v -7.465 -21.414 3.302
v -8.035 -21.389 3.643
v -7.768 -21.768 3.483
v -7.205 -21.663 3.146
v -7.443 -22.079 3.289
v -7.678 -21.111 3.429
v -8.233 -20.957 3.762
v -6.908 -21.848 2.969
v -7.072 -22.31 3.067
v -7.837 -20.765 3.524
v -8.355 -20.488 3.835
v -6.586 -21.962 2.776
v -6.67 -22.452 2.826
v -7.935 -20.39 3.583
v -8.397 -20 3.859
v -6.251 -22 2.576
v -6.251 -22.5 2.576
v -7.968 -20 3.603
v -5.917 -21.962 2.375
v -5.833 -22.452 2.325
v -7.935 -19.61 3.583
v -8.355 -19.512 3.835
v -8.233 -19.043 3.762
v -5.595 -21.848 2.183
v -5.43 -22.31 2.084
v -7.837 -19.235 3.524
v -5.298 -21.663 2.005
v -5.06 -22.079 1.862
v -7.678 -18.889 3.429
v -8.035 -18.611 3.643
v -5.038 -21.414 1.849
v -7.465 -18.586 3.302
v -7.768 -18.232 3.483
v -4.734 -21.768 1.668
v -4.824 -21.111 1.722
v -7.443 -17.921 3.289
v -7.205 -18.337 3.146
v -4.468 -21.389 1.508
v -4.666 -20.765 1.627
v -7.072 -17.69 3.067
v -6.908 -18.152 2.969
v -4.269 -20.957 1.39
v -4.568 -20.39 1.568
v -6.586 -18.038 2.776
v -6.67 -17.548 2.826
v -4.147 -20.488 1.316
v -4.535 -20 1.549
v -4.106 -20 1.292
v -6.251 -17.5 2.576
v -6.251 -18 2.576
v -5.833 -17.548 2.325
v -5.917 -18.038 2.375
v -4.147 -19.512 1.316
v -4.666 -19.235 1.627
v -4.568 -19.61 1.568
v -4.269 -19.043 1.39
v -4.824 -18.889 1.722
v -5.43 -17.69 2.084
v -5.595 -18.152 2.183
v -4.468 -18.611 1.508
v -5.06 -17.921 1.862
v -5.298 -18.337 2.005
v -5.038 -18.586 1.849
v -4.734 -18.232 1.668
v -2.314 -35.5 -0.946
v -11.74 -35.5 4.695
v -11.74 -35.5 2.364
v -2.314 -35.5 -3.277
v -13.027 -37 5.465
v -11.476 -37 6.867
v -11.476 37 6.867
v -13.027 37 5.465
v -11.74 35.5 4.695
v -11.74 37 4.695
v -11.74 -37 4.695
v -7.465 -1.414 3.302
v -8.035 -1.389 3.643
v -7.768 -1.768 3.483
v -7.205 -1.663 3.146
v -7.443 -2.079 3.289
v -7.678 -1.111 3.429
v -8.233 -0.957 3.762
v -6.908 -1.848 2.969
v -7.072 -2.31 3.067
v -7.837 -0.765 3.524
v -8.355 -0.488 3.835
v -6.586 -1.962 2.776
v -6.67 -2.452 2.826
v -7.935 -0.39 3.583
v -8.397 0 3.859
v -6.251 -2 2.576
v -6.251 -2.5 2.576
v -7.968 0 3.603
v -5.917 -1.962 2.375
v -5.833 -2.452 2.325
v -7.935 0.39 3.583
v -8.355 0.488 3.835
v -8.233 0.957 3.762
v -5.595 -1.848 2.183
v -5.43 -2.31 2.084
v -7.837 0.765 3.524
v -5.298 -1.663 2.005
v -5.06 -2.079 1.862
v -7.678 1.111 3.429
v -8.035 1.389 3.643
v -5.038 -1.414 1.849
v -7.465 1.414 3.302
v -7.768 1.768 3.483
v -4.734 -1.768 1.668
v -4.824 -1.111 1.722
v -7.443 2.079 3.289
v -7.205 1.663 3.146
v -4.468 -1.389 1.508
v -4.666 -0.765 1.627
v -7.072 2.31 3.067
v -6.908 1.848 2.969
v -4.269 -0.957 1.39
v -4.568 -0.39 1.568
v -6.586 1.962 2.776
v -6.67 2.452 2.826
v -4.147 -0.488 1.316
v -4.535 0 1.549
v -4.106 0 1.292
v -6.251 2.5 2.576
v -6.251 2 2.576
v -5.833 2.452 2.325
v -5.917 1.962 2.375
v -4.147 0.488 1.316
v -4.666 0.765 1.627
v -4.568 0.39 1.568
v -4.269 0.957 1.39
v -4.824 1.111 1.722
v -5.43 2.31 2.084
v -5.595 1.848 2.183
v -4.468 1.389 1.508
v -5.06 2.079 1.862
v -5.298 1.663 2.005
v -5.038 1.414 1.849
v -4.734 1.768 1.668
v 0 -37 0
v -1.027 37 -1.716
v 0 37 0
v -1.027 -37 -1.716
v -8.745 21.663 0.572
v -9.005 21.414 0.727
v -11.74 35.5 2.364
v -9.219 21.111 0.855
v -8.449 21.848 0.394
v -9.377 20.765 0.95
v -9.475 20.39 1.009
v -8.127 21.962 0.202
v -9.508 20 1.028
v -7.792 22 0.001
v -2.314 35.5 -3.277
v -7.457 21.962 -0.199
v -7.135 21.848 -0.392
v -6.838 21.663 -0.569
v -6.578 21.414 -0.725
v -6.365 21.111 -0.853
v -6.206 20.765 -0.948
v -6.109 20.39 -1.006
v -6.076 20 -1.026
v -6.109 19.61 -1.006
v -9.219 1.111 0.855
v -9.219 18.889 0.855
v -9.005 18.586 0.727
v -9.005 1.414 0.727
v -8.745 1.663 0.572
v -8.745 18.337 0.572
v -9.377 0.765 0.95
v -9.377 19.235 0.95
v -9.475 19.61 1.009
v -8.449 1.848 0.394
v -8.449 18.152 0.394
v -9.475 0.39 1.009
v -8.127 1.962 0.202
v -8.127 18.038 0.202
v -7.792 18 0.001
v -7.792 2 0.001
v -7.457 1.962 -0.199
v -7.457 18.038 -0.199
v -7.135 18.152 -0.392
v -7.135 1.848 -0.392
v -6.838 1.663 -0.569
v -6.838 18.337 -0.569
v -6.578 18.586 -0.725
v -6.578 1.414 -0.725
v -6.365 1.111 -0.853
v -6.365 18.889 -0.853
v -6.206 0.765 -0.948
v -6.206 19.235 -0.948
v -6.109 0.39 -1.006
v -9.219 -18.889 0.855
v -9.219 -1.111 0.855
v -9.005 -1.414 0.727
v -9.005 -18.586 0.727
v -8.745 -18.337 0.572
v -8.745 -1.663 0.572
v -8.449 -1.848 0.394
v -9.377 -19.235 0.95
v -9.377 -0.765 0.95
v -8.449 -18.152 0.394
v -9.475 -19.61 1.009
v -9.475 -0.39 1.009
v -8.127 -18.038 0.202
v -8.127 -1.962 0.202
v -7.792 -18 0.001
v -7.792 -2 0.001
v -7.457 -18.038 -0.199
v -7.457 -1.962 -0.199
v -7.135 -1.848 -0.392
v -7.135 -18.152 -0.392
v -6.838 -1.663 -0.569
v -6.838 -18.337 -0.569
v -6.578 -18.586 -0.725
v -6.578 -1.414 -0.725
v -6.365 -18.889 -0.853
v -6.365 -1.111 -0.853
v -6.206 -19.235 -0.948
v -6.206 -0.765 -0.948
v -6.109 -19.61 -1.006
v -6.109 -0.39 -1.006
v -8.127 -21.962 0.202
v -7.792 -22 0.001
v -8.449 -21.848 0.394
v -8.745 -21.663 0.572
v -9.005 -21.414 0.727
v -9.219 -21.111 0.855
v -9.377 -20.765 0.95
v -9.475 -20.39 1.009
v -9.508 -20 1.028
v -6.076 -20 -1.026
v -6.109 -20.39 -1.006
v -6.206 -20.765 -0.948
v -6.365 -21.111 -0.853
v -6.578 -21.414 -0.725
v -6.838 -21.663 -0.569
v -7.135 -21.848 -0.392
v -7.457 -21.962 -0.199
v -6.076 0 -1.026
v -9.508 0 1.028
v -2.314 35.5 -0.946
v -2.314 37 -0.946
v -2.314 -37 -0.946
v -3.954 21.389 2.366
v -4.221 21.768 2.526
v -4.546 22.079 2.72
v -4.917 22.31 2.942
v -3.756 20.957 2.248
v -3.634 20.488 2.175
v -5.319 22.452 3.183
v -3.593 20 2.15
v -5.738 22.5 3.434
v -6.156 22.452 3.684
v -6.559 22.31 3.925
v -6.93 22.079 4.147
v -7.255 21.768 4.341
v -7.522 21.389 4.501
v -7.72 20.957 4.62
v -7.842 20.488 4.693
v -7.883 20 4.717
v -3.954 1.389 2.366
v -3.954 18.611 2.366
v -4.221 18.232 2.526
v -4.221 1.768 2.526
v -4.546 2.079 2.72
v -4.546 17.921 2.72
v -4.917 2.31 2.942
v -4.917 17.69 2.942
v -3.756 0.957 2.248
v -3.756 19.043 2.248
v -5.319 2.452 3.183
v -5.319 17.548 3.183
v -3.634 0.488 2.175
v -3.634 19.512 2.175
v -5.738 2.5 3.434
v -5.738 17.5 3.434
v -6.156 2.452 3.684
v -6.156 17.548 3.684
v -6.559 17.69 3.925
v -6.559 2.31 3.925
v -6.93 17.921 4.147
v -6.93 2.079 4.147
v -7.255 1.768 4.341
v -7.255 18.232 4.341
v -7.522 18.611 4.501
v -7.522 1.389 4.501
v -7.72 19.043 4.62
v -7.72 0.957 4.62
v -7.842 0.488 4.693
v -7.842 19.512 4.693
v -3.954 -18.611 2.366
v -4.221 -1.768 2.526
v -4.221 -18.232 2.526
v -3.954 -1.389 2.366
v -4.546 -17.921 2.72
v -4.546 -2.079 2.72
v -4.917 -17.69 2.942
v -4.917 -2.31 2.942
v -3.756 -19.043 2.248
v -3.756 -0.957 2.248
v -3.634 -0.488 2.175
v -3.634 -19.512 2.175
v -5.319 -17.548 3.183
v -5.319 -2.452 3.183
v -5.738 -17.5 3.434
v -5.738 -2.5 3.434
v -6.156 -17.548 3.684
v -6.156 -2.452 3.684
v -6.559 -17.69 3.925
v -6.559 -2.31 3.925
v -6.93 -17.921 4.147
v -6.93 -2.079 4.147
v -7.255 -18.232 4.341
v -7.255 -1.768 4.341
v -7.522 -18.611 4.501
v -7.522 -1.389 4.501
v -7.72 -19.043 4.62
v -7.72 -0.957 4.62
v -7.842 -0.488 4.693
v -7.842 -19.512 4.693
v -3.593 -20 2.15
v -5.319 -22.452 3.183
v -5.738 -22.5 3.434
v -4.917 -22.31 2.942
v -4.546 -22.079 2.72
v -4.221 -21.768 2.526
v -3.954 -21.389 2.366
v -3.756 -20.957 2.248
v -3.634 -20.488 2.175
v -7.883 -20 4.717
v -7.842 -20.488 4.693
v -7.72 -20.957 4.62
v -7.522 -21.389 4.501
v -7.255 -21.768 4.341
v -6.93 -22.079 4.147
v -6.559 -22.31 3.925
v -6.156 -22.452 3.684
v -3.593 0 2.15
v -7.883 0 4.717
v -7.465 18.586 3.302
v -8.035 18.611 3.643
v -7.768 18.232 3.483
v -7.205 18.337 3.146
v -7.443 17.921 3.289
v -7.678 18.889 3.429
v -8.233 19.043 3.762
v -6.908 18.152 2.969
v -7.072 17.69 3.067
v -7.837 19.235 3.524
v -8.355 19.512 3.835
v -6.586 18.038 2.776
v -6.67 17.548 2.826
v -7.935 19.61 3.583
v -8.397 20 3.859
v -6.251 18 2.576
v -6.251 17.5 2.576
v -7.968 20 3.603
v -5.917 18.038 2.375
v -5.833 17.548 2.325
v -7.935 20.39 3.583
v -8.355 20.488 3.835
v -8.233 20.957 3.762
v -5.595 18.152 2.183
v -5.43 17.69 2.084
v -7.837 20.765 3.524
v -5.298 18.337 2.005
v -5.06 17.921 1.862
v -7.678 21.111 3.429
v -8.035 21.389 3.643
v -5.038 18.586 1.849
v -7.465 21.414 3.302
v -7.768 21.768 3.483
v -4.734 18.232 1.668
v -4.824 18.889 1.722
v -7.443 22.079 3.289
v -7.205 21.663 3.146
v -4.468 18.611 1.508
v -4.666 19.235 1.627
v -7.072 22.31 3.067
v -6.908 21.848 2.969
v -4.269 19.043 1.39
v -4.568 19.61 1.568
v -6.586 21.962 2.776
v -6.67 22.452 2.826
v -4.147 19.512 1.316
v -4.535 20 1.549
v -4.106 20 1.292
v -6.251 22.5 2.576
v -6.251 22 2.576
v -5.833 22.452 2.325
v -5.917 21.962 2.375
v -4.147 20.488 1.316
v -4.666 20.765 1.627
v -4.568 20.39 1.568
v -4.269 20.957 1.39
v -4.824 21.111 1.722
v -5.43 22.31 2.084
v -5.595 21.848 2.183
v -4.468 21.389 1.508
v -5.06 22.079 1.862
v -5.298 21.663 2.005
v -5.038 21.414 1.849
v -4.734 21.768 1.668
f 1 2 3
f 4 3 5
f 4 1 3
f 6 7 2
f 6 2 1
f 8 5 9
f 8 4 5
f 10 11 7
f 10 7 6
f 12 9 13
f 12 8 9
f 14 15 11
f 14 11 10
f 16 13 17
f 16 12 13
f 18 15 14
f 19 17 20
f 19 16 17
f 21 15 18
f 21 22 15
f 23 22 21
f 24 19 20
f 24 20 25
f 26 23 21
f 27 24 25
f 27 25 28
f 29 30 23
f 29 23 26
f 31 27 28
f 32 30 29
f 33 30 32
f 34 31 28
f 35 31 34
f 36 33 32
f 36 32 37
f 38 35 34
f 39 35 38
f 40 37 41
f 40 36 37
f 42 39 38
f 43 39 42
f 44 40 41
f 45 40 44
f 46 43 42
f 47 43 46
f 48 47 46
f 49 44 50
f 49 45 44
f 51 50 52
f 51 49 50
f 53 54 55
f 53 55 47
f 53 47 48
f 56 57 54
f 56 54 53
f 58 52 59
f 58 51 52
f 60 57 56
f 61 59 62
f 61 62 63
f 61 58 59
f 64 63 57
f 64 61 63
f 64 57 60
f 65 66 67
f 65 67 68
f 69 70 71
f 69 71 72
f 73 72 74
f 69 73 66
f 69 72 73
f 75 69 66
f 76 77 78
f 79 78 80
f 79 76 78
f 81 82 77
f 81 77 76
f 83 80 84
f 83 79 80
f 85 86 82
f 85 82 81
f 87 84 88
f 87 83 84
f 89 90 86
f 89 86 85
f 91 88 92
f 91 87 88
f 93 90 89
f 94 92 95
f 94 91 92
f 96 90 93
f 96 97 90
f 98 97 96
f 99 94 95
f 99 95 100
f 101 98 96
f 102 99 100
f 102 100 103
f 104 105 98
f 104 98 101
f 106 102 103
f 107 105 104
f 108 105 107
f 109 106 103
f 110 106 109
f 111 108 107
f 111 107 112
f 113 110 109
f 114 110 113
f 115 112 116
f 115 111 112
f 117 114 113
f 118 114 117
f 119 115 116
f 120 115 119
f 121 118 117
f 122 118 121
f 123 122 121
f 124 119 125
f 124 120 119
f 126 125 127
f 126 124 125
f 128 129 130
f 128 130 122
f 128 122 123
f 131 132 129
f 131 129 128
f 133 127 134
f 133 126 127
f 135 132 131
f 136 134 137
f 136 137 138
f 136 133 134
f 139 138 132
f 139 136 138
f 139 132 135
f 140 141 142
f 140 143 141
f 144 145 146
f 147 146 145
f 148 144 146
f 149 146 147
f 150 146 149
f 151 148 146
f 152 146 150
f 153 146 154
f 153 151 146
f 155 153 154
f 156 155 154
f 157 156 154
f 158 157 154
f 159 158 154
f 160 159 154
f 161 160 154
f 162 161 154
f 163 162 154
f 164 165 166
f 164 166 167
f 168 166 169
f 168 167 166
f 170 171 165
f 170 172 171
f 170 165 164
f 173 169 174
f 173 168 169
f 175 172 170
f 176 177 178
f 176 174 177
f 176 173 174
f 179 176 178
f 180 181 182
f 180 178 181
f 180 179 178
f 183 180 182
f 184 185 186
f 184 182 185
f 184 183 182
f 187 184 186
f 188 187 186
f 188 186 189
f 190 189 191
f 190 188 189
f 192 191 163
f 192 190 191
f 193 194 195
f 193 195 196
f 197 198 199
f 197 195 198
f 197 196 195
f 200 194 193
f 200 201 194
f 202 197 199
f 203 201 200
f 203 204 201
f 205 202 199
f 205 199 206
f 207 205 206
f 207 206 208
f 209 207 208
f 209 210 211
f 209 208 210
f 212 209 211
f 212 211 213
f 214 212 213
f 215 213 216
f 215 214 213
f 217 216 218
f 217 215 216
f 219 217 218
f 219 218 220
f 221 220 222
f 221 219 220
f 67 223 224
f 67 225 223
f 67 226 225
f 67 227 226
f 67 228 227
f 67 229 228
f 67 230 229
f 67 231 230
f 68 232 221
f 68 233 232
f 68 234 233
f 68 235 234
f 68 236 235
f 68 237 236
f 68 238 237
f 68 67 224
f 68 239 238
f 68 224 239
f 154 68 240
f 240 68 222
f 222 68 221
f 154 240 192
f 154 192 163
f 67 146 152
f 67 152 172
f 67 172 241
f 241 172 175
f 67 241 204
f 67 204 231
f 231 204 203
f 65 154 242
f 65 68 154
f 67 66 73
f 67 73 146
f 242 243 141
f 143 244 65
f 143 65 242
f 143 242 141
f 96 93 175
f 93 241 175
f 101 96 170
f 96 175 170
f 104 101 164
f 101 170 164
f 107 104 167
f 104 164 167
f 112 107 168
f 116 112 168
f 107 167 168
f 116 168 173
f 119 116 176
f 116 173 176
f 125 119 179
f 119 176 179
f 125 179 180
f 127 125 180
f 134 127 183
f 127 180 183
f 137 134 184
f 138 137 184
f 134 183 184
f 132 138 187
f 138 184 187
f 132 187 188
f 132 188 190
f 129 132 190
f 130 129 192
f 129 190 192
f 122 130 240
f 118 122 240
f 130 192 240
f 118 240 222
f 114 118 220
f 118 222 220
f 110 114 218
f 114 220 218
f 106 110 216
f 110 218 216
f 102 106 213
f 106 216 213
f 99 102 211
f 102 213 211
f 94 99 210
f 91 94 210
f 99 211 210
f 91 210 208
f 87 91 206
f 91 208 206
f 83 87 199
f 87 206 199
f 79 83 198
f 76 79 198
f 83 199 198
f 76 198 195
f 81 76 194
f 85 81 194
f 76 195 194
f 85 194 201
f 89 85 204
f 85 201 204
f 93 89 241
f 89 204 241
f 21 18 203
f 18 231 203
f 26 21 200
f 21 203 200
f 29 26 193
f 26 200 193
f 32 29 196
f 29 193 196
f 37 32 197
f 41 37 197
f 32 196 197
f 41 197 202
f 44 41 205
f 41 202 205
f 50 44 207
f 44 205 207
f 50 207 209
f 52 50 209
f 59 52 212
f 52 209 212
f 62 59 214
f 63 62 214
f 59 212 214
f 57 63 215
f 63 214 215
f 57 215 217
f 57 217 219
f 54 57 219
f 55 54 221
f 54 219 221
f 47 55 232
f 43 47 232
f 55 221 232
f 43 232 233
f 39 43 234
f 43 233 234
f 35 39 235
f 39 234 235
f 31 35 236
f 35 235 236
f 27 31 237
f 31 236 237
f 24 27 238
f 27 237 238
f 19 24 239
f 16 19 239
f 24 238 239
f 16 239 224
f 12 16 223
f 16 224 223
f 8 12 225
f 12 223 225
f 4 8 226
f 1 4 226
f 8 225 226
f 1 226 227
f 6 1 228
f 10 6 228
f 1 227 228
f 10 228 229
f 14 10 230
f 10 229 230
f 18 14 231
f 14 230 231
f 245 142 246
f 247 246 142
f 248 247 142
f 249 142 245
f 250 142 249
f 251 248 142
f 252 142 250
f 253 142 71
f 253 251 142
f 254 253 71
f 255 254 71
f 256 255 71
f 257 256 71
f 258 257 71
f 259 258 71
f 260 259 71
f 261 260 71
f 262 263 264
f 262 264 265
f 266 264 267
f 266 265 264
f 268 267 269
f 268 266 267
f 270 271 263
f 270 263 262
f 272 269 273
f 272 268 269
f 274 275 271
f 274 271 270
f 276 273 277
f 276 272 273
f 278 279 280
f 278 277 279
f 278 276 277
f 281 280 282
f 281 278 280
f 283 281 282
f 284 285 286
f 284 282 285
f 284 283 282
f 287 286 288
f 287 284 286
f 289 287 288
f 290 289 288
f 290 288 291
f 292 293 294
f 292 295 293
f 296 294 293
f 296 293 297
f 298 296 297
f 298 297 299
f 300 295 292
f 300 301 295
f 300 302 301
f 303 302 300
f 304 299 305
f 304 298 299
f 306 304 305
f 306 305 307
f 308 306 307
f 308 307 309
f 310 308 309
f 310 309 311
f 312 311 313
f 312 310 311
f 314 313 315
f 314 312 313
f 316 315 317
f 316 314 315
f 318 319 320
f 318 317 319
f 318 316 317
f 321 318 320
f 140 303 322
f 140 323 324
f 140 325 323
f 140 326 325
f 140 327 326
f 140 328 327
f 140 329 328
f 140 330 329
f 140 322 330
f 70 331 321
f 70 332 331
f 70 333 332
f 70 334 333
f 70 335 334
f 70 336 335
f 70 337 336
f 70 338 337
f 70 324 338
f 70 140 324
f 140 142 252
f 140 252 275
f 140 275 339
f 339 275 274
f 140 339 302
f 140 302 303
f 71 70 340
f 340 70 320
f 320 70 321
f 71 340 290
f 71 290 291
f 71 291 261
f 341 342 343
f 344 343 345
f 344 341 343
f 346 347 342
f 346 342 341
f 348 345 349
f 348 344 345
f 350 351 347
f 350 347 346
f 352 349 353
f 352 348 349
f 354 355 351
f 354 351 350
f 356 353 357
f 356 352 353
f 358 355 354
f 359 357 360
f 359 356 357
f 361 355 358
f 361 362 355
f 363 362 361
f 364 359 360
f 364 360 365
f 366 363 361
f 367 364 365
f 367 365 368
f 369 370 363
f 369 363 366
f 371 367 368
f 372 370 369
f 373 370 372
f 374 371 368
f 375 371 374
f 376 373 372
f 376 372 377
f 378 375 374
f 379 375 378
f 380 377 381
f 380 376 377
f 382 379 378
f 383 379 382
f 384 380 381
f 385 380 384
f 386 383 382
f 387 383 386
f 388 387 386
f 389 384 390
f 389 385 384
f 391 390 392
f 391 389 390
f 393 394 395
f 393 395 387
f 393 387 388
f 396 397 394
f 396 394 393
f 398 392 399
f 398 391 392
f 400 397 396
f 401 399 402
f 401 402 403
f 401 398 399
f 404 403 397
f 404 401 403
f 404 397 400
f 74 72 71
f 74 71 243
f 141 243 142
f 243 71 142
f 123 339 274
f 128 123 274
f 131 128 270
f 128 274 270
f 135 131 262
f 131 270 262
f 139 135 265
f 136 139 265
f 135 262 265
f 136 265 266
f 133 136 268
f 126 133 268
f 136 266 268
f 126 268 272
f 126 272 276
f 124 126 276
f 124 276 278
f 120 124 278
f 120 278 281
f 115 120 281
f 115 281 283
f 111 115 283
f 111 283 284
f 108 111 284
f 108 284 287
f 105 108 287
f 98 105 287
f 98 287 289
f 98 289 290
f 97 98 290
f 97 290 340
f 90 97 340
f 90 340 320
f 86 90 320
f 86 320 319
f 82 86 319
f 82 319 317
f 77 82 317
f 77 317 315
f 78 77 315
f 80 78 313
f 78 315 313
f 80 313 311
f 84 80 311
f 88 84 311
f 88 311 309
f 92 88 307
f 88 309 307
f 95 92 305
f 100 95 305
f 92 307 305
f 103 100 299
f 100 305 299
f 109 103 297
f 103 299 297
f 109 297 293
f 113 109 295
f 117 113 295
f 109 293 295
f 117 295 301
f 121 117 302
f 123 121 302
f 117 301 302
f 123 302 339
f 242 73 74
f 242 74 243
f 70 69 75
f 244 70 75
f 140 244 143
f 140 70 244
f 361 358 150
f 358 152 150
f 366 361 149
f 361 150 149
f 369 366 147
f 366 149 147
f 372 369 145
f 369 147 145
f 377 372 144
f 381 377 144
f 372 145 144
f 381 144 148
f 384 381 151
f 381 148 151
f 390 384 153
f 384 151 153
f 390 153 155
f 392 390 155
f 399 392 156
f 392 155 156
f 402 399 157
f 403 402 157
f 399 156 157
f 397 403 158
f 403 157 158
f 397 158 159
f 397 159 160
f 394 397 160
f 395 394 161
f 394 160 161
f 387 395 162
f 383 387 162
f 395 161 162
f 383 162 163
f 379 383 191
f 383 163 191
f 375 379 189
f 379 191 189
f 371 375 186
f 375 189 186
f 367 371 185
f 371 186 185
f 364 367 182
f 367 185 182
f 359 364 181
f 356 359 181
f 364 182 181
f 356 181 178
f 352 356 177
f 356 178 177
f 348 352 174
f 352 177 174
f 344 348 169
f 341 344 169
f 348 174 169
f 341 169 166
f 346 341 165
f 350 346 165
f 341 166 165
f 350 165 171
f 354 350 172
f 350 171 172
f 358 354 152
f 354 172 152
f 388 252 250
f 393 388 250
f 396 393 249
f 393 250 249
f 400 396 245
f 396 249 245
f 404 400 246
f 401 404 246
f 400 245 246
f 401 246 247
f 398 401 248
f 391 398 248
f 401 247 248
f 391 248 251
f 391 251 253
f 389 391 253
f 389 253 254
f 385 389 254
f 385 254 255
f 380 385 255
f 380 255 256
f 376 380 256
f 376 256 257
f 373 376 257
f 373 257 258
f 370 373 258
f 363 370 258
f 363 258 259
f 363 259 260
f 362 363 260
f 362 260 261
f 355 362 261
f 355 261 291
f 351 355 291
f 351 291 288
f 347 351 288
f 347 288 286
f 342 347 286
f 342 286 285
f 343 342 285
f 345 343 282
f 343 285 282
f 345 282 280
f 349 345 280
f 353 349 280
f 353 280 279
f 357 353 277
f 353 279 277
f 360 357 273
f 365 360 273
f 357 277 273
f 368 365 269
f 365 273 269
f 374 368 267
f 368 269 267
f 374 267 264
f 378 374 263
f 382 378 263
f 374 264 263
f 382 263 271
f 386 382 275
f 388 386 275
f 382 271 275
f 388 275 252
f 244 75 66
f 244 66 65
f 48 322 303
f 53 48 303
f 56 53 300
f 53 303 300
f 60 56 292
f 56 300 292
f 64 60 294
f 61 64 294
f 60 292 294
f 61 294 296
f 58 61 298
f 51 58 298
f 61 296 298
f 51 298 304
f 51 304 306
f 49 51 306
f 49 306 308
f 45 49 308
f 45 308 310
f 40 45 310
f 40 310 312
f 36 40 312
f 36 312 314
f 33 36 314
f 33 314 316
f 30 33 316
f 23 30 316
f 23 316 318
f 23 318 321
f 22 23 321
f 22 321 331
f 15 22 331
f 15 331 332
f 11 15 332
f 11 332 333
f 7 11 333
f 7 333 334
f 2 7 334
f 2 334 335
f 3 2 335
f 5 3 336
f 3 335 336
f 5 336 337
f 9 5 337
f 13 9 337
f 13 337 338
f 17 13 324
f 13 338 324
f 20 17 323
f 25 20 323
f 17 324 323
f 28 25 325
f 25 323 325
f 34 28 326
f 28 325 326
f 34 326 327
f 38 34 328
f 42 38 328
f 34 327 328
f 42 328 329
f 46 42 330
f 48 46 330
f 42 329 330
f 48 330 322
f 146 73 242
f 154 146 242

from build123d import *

# Parameters (mm, degrees)
F1_DEPTH       = 37
F2_DEPTH       = 35.5
F4_D           = 4
F4_DEPTH       = 5
F4_CBORE_D     = 5
F4_CBORE_DEPTH = 1
F4_TIP         = 1.2017212381


with BuildPart() as f1:
    # F0 (on Front) → F1 (new body, symmetric)
    with BuildSketch(Plane.XZ):
        Polygon((-1.0269926464, -1.716183587), (0, 0), (-11.4757237546, 6.8672629181), (-13.0274063785, 5.4650624927), (-11.7402686883, 4.6948180079), (-2.3141303366, -0.9459391022), align=None)
    extrude(amount=F1_DEPTH, both=True)

    # F0 (on Front) → F2 (join, symmetric)
    with BuildSketch(Plane.XZ):
        Polygon((-2.3141303366, -3.2766920766), (-2.3141303366, -0.9459391022), (-11.7402686883, 4.6948180079), (-11.7402686883, 2.3640650335), align=None)
    extrude(amount=F2_DEPTH, both=True)

    # F4
    with Locations(Plane(origin=(0, 0, 0), x_dir=(0.8580917935, 0, -0.5134963232), z_dir=(0.5134963232, 0, 0.8580917935))):
        with Locations((-6.6867693185, 20), (-6.6867693185, 0), (-6.6867693185, -20)):
            CounterBoreHole(F4_D / 2, F4_CBORE_D / 2, F4_CBORE_DEPTH, depth=F4_DEPTH)
            with Locations((0, 0, -(F4_DEPTH + F4_TIP / 2))):  # 118° drill point
                Cone(0, F4_D / 2, F4_TIP, mode=Mode.SUBTRACT)


solid = f1.part
